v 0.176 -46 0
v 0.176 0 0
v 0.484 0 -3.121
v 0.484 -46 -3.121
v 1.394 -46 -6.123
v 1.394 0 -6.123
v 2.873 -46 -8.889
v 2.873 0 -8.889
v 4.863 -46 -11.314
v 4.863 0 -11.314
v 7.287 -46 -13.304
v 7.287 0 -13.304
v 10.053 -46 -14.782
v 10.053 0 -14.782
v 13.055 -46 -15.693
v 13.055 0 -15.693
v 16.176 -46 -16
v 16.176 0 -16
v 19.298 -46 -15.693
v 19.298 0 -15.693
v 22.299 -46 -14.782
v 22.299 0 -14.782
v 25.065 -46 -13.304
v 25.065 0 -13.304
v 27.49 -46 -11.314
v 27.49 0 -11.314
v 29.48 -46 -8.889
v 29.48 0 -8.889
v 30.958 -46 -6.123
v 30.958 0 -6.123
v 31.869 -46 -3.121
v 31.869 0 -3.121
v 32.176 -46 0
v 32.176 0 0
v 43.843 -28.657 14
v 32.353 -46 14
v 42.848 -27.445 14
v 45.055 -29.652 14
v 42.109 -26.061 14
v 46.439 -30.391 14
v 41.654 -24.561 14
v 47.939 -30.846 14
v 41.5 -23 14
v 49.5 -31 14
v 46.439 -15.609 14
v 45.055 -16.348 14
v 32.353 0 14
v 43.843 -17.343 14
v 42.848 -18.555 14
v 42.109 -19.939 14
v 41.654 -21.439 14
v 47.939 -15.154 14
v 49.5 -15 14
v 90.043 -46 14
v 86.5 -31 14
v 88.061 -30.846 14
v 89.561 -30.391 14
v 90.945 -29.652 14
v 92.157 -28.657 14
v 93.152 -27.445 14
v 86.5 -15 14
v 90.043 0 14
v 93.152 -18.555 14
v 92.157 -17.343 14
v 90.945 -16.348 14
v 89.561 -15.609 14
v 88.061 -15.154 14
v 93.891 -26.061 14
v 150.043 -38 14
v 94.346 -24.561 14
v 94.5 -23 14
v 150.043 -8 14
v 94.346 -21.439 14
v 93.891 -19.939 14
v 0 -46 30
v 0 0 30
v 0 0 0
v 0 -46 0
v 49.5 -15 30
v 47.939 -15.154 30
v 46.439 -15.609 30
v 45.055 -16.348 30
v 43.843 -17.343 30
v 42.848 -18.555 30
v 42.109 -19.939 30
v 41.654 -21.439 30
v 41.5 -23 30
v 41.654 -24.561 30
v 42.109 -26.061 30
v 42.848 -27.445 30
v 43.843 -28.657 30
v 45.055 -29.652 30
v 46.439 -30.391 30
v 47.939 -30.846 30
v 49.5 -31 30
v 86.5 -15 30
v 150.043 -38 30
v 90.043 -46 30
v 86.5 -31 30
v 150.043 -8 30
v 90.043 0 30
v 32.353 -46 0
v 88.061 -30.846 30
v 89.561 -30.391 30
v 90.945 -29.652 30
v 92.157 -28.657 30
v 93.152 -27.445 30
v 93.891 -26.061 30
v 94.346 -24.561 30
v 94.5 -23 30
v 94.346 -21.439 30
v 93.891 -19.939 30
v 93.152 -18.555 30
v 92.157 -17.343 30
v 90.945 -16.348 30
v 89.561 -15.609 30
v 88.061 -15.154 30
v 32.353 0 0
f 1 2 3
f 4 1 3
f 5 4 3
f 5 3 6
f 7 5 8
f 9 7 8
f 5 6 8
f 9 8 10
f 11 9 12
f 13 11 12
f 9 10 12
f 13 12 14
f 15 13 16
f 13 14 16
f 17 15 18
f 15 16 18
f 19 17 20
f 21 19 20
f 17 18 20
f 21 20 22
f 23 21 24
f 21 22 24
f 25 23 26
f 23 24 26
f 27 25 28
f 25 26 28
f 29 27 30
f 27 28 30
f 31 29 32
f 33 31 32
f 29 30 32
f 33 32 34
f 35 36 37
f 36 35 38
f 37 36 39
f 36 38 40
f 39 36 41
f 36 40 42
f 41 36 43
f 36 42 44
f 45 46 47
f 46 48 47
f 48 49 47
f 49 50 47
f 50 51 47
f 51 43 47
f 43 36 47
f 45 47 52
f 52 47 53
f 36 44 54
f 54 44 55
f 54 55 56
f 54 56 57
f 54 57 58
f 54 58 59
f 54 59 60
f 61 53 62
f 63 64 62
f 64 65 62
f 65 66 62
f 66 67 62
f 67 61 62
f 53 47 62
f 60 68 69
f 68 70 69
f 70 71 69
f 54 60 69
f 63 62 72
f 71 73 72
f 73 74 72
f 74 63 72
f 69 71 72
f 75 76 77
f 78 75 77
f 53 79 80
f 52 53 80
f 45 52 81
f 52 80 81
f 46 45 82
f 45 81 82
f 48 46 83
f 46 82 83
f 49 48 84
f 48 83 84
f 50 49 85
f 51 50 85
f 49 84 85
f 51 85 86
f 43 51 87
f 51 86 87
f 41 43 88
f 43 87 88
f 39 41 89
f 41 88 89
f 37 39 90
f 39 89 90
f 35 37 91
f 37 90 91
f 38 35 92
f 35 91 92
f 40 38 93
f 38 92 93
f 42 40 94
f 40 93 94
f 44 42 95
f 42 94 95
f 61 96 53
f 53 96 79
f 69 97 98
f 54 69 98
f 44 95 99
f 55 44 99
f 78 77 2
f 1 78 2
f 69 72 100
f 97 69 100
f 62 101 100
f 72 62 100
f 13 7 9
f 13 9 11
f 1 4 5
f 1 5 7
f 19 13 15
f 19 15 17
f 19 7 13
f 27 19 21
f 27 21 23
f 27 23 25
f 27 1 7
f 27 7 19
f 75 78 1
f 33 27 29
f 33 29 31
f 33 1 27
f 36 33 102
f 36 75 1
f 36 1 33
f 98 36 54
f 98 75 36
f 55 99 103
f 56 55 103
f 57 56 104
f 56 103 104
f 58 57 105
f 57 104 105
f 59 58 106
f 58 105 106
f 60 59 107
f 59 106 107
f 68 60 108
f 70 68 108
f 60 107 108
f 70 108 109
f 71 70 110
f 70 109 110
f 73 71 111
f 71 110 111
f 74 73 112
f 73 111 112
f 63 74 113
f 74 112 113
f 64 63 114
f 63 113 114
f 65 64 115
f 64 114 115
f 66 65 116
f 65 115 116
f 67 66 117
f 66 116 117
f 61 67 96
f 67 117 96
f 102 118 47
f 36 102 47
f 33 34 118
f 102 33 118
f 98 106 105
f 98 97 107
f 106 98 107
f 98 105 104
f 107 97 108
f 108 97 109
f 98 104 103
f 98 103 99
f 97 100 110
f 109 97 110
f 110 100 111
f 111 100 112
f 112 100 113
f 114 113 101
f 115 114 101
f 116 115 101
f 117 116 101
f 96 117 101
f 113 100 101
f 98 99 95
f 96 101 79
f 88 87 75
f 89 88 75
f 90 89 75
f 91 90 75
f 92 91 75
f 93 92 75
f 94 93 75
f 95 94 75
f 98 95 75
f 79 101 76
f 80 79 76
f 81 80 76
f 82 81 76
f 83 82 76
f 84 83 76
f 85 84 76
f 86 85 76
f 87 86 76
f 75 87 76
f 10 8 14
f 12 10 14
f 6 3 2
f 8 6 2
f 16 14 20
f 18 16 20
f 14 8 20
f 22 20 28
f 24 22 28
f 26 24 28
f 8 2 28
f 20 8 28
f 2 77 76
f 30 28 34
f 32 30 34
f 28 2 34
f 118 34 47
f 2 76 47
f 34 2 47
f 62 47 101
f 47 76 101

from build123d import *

# Parameters (mm, degrees)
F1_DEPTH = 46
F3_DEPTH = 16
F5_DEPTH = 46.001


# Not quite as in the source:
# - a feature names something its author has since deleted; it is built from what else it names


with BuildPart() as f1:
    # F0 (on Front) → F1 (new body)
    with BuildSketch(Plane.XZ):
        with BuildLine():
            ThreePointArc((0.1762595361, 0), (16.1762595361, -16), (32.1762595361, 0))
            Line((32.1762595361, 0), (0.1762595361, 0))
        make_face()
        with BuildLine():
            Line((0.1762595361, 0), (32.1762595361, 0))
            ThreePointArc((32.1762595361, 0), (16.1762595361, 16), (0.1762595361, 0))
        make_face()
        with BuildLine():
            ThreePointArc((0.1762595361, 0), (16.1762595361, 16), (32.1762595361, 0))
            Line((32.1762595361, 0), (32.3525190723, 0))
            Line((32.3525190723, 0), (32.3525190723, 14))
            Line((32.3525190723, 14), (32.3525190723, 30))
            Line((32.3525190723, 30), (0, 30))
            Line((0, 30), (0, 0))
            Line((0, 0), (0.1762595361, 0))
        make_face()
        Polygon((32.3525190723, 30), (32.3525190723, 14), (150.0428766012, 14), (150.0428766012, 30), (104.9743145704, 30), (67.9628998041, 30), (45.0152419508, 30), align=None)
    extrude(amount=F1_DEPTH)

    # F2 (on face) → F3 (cut)
    with BuildSketch(Plane.XY.offset(30)):
        Polygon((90.0428766012, 0), (150.0428766012, -8), (150.0428766012, 0), align=None)
        Polygon((90.0428766012, -46), (150.0428766012, -46), (150.0428766012, -38), align=None)
    extrude(amount=-F3_DEPTH, mode=Mode.SUBTRACT)

    # F4 (on face) → F5 (cut, through all)
    with BuildSketch(Plane.XY.offset(30)):
        with BuildLine():
            Line((86.5, -15), (68, -15))
            Line((68, -15), (49.5, -15))
            ThreePointArc((49.5, -15), (41.5, -23), (49.5, -31))
            Line((49.5, -31), (68, -31))
            Line((68, -31), (86.5, -31))
            ThreePointArc((86.5, -31), (94.5, -23), (86.5, -15))
        make_face()
    extrude(amount=-F5_DEPTH, mode=Mode.SUBTRACT)


solid = f1.part
